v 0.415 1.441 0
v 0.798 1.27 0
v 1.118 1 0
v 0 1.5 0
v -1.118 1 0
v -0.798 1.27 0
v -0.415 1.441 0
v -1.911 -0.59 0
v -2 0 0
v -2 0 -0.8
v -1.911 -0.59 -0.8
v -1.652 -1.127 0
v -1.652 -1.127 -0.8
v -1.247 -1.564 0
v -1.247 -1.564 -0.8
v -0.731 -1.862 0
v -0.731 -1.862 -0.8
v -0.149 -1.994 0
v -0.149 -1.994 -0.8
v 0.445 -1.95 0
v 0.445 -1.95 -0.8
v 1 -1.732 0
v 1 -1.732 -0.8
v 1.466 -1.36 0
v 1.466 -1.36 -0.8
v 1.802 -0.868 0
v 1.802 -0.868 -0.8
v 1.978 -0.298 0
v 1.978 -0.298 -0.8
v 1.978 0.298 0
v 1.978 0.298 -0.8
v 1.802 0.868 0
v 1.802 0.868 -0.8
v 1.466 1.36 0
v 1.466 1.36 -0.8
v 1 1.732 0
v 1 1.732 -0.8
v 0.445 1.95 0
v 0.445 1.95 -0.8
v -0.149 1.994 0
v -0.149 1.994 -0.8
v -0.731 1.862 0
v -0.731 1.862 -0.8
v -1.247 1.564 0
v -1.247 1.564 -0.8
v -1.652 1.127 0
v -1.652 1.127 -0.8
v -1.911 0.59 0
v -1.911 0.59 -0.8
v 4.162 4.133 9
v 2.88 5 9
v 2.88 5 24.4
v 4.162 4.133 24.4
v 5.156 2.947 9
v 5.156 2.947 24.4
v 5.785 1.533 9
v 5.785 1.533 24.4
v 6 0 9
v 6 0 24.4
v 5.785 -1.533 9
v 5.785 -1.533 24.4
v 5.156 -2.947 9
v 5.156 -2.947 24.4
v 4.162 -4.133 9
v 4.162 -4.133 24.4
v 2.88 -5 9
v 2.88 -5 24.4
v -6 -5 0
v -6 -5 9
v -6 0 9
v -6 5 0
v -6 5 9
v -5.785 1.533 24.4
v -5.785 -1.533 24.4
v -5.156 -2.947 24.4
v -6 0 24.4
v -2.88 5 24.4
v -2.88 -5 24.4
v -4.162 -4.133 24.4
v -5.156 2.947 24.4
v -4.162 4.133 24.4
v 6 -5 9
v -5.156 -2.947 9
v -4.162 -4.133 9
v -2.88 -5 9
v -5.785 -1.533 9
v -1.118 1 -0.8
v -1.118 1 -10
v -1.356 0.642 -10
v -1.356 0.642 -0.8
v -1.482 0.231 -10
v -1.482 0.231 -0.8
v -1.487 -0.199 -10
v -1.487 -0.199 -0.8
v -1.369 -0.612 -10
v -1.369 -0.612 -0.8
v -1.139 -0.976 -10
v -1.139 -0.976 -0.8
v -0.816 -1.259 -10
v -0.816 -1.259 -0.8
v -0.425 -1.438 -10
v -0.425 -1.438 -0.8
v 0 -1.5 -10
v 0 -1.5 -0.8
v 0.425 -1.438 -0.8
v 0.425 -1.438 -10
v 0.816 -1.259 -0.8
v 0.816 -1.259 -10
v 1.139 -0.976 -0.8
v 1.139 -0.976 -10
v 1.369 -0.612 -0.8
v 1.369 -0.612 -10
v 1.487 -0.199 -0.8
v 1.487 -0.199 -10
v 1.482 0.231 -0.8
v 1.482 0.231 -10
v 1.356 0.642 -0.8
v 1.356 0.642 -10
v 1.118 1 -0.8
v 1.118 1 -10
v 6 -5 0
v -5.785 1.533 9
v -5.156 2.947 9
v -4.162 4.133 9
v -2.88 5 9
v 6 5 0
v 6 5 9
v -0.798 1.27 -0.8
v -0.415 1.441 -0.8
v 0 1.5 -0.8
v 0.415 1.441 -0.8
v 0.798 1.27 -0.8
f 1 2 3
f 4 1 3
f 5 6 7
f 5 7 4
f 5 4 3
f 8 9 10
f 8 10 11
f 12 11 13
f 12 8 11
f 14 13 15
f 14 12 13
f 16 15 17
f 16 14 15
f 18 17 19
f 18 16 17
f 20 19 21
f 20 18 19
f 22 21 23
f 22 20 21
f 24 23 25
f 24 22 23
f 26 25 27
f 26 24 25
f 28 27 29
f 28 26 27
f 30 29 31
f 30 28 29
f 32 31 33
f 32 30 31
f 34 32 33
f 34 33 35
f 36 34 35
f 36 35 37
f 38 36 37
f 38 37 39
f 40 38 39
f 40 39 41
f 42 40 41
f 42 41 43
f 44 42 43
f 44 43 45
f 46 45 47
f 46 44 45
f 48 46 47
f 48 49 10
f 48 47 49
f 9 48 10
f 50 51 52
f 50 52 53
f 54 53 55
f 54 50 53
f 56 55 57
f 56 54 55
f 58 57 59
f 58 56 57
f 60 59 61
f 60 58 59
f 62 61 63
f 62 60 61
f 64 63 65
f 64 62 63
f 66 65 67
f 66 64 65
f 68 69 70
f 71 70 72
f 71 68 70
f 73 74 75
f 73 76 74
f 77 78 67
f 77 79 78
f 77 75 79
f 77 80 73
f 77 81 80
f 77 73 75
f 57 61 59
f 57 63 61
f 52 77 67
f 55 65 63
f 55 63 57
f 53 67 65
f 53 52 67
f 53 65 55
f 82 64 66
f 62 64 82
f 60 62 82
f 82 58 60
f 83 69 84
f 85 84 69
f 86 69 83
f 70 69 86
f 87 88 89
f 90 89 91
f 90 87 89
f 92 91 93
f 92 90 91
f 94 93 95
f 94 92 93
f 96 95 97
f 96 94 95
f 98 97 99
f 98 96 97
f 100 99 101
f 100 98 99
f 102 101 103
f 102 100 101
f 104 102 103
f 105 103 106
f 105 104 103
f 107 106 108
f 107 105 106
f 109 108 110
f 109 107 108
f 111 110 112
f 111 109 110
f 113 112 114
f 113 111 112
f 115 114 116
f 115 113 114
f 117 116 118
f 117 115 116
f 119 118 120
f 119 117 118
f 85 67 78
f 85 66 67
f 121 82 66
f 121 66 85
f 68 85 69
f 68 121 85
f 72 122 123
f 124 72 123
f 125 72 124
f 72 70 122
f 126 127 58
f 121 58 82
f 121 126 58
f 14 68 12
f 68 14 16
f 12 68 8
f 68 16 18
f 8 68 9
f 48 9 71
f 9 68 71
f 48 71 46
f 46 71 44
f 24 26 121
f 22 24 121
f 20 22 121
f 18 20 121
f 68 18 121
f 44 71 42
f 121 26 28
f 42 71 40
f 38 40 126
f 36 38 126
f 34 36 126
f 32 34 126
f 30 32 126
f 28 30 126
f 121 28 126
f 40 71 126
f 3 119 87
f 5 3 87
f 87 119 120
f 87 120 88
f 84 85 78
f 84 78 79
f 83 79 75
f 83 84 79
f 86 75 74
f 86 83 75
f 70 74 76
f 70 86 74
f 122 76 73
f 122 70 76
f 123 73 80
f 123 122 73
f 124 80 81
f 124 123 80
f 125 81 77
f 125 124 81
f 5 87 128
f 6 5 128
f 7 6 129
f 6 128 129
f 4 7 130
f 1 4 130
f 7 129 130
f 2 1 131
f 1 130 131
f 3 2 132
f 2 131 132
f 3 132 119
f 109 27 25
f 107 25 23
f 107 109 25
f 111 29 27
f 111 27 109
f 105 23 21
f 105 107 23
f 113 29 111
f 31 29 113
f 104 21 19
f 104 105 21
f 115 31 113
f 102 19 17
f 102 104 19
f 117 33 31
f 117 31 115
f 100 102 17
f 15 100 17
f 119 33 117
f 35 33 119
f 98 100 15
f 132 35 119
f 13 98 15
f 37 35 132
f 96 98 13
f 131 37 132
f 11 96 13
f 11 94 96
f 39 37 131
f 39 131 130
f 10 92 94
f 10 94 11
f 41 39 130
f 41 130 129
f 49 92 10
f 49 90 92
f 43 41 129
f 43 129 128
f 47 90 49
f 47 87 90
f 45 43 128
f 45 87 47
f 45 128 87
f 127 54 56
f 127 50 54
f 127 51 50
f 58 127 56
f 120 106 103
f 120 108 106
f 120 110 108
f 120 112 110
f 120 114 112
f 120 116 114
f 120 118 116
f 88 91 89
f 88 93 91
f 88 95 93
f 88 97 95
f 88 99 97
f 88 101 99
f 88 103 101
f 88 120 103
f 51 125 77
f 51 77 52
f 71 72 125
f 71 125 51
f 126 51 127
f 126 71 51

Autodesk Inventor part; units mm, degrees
ref_plane "YZ Plane" through (0, 0, 0) normal (1, 0, 0) x (0, 1, 0)
ref_plane "XZ Plane" through (0, 0, 0) normal (0, 1, 0) x (-1, 0, 0)
ref_plane "XY Plane" through (0, 0, 0) normal (0, 0, 1) x (1, 0, 0)
sketch "스케치1" plane through (0, 0, 0) normal (0, 0, 1) x (1, 0, 0)
  line L0 (-6, 5) -> (6, 5)
  line L1 (6, 5) -> (6, -5)
  line L2 (6, -5) -> (-6, -5)
  line L3 (-6, -5) -> (-6, 5)
  line L4 (-6, 5) -> (6, -5) construction
  line L5 (6, 5) -> (-6, -5) construction
  point P0 (0, 0)
  dimension "d0" = 12
  dimension "d1" = 10
extrude "돌출1" add sketch "스케치1" along normal blind 9
sketch "스케치2" plane through (0, 0, 9) normal (0, 0, 1) x (1, 0, 0)
  line L0 (-6, 5) -> (-6, -5) projected
  line L1 (-6, -5) -> (6, -5) projected
  line L2 (6, -5) -> (6, 5) projected
  line L3 (6, 5) -> (-6, 5) projected
  line L4 (-2.8796, -5) -> (2.8796, -5)
  line L5 (2.8796, -5) -> (2.8796, 5) construction
  line L6 (2.8796, 5) -> (-2.8796, 5)
  line L7 (-2.8796, 5) -> (-2.8796, -5) construction
  line L8 (-2.8796, -5) -> (2.8796, 5) construction
  line L9 (2.8796, -5) -> (-2.8796, 5) construction
  line L10 (-6, 0) -> (6, 0) construction
  arc A0 (-2.8796, 5) -> (-2.8796, -5) centre (-0.4339, 0) ccw
  arc A1 (2.8796, -5) -> (2.8796, 5) centre (0.4339, 0) ccw
  point P0 (0, 0)
extrude "돌출2" add sketch "스케치2" along normal blind 15.4 contours A0 L3 A1 L1
sketch "스케치3" plane through (0, 0, 0) normal (0, 0, -1) x (-1, 0, 0)
  circle A0 centre (0, 0) radius 2
  dimension "d6" = 4
extrude "돌출3" add sketch "스케치3" along normal blind 0.8
sketch "스케치4" plane through (0, 0, 0) normal (0, 0, -1) x (-1, 0, 0)
  circle A0 centre (0, 0) radius 1.5
  dimension "d9" = 3
extrude "돌출4" add sketch "스케치4" along normal blind 10
sketch "스케치5" plane through (0, 0, -10) normal (0, 0, -1) x (-1, 0, 0)
  circle A0 centre (0, 0) radius 1.5 projected
  line L0 (-1.118, 1) -> (1.118, 1)
  dimension "d12" = 1
extrude "돌출5" cut sketch "스케치5" against normal blind 10 contours L0 A0 picked at (-0.0599, 1.1631)
properties part number "모터"
